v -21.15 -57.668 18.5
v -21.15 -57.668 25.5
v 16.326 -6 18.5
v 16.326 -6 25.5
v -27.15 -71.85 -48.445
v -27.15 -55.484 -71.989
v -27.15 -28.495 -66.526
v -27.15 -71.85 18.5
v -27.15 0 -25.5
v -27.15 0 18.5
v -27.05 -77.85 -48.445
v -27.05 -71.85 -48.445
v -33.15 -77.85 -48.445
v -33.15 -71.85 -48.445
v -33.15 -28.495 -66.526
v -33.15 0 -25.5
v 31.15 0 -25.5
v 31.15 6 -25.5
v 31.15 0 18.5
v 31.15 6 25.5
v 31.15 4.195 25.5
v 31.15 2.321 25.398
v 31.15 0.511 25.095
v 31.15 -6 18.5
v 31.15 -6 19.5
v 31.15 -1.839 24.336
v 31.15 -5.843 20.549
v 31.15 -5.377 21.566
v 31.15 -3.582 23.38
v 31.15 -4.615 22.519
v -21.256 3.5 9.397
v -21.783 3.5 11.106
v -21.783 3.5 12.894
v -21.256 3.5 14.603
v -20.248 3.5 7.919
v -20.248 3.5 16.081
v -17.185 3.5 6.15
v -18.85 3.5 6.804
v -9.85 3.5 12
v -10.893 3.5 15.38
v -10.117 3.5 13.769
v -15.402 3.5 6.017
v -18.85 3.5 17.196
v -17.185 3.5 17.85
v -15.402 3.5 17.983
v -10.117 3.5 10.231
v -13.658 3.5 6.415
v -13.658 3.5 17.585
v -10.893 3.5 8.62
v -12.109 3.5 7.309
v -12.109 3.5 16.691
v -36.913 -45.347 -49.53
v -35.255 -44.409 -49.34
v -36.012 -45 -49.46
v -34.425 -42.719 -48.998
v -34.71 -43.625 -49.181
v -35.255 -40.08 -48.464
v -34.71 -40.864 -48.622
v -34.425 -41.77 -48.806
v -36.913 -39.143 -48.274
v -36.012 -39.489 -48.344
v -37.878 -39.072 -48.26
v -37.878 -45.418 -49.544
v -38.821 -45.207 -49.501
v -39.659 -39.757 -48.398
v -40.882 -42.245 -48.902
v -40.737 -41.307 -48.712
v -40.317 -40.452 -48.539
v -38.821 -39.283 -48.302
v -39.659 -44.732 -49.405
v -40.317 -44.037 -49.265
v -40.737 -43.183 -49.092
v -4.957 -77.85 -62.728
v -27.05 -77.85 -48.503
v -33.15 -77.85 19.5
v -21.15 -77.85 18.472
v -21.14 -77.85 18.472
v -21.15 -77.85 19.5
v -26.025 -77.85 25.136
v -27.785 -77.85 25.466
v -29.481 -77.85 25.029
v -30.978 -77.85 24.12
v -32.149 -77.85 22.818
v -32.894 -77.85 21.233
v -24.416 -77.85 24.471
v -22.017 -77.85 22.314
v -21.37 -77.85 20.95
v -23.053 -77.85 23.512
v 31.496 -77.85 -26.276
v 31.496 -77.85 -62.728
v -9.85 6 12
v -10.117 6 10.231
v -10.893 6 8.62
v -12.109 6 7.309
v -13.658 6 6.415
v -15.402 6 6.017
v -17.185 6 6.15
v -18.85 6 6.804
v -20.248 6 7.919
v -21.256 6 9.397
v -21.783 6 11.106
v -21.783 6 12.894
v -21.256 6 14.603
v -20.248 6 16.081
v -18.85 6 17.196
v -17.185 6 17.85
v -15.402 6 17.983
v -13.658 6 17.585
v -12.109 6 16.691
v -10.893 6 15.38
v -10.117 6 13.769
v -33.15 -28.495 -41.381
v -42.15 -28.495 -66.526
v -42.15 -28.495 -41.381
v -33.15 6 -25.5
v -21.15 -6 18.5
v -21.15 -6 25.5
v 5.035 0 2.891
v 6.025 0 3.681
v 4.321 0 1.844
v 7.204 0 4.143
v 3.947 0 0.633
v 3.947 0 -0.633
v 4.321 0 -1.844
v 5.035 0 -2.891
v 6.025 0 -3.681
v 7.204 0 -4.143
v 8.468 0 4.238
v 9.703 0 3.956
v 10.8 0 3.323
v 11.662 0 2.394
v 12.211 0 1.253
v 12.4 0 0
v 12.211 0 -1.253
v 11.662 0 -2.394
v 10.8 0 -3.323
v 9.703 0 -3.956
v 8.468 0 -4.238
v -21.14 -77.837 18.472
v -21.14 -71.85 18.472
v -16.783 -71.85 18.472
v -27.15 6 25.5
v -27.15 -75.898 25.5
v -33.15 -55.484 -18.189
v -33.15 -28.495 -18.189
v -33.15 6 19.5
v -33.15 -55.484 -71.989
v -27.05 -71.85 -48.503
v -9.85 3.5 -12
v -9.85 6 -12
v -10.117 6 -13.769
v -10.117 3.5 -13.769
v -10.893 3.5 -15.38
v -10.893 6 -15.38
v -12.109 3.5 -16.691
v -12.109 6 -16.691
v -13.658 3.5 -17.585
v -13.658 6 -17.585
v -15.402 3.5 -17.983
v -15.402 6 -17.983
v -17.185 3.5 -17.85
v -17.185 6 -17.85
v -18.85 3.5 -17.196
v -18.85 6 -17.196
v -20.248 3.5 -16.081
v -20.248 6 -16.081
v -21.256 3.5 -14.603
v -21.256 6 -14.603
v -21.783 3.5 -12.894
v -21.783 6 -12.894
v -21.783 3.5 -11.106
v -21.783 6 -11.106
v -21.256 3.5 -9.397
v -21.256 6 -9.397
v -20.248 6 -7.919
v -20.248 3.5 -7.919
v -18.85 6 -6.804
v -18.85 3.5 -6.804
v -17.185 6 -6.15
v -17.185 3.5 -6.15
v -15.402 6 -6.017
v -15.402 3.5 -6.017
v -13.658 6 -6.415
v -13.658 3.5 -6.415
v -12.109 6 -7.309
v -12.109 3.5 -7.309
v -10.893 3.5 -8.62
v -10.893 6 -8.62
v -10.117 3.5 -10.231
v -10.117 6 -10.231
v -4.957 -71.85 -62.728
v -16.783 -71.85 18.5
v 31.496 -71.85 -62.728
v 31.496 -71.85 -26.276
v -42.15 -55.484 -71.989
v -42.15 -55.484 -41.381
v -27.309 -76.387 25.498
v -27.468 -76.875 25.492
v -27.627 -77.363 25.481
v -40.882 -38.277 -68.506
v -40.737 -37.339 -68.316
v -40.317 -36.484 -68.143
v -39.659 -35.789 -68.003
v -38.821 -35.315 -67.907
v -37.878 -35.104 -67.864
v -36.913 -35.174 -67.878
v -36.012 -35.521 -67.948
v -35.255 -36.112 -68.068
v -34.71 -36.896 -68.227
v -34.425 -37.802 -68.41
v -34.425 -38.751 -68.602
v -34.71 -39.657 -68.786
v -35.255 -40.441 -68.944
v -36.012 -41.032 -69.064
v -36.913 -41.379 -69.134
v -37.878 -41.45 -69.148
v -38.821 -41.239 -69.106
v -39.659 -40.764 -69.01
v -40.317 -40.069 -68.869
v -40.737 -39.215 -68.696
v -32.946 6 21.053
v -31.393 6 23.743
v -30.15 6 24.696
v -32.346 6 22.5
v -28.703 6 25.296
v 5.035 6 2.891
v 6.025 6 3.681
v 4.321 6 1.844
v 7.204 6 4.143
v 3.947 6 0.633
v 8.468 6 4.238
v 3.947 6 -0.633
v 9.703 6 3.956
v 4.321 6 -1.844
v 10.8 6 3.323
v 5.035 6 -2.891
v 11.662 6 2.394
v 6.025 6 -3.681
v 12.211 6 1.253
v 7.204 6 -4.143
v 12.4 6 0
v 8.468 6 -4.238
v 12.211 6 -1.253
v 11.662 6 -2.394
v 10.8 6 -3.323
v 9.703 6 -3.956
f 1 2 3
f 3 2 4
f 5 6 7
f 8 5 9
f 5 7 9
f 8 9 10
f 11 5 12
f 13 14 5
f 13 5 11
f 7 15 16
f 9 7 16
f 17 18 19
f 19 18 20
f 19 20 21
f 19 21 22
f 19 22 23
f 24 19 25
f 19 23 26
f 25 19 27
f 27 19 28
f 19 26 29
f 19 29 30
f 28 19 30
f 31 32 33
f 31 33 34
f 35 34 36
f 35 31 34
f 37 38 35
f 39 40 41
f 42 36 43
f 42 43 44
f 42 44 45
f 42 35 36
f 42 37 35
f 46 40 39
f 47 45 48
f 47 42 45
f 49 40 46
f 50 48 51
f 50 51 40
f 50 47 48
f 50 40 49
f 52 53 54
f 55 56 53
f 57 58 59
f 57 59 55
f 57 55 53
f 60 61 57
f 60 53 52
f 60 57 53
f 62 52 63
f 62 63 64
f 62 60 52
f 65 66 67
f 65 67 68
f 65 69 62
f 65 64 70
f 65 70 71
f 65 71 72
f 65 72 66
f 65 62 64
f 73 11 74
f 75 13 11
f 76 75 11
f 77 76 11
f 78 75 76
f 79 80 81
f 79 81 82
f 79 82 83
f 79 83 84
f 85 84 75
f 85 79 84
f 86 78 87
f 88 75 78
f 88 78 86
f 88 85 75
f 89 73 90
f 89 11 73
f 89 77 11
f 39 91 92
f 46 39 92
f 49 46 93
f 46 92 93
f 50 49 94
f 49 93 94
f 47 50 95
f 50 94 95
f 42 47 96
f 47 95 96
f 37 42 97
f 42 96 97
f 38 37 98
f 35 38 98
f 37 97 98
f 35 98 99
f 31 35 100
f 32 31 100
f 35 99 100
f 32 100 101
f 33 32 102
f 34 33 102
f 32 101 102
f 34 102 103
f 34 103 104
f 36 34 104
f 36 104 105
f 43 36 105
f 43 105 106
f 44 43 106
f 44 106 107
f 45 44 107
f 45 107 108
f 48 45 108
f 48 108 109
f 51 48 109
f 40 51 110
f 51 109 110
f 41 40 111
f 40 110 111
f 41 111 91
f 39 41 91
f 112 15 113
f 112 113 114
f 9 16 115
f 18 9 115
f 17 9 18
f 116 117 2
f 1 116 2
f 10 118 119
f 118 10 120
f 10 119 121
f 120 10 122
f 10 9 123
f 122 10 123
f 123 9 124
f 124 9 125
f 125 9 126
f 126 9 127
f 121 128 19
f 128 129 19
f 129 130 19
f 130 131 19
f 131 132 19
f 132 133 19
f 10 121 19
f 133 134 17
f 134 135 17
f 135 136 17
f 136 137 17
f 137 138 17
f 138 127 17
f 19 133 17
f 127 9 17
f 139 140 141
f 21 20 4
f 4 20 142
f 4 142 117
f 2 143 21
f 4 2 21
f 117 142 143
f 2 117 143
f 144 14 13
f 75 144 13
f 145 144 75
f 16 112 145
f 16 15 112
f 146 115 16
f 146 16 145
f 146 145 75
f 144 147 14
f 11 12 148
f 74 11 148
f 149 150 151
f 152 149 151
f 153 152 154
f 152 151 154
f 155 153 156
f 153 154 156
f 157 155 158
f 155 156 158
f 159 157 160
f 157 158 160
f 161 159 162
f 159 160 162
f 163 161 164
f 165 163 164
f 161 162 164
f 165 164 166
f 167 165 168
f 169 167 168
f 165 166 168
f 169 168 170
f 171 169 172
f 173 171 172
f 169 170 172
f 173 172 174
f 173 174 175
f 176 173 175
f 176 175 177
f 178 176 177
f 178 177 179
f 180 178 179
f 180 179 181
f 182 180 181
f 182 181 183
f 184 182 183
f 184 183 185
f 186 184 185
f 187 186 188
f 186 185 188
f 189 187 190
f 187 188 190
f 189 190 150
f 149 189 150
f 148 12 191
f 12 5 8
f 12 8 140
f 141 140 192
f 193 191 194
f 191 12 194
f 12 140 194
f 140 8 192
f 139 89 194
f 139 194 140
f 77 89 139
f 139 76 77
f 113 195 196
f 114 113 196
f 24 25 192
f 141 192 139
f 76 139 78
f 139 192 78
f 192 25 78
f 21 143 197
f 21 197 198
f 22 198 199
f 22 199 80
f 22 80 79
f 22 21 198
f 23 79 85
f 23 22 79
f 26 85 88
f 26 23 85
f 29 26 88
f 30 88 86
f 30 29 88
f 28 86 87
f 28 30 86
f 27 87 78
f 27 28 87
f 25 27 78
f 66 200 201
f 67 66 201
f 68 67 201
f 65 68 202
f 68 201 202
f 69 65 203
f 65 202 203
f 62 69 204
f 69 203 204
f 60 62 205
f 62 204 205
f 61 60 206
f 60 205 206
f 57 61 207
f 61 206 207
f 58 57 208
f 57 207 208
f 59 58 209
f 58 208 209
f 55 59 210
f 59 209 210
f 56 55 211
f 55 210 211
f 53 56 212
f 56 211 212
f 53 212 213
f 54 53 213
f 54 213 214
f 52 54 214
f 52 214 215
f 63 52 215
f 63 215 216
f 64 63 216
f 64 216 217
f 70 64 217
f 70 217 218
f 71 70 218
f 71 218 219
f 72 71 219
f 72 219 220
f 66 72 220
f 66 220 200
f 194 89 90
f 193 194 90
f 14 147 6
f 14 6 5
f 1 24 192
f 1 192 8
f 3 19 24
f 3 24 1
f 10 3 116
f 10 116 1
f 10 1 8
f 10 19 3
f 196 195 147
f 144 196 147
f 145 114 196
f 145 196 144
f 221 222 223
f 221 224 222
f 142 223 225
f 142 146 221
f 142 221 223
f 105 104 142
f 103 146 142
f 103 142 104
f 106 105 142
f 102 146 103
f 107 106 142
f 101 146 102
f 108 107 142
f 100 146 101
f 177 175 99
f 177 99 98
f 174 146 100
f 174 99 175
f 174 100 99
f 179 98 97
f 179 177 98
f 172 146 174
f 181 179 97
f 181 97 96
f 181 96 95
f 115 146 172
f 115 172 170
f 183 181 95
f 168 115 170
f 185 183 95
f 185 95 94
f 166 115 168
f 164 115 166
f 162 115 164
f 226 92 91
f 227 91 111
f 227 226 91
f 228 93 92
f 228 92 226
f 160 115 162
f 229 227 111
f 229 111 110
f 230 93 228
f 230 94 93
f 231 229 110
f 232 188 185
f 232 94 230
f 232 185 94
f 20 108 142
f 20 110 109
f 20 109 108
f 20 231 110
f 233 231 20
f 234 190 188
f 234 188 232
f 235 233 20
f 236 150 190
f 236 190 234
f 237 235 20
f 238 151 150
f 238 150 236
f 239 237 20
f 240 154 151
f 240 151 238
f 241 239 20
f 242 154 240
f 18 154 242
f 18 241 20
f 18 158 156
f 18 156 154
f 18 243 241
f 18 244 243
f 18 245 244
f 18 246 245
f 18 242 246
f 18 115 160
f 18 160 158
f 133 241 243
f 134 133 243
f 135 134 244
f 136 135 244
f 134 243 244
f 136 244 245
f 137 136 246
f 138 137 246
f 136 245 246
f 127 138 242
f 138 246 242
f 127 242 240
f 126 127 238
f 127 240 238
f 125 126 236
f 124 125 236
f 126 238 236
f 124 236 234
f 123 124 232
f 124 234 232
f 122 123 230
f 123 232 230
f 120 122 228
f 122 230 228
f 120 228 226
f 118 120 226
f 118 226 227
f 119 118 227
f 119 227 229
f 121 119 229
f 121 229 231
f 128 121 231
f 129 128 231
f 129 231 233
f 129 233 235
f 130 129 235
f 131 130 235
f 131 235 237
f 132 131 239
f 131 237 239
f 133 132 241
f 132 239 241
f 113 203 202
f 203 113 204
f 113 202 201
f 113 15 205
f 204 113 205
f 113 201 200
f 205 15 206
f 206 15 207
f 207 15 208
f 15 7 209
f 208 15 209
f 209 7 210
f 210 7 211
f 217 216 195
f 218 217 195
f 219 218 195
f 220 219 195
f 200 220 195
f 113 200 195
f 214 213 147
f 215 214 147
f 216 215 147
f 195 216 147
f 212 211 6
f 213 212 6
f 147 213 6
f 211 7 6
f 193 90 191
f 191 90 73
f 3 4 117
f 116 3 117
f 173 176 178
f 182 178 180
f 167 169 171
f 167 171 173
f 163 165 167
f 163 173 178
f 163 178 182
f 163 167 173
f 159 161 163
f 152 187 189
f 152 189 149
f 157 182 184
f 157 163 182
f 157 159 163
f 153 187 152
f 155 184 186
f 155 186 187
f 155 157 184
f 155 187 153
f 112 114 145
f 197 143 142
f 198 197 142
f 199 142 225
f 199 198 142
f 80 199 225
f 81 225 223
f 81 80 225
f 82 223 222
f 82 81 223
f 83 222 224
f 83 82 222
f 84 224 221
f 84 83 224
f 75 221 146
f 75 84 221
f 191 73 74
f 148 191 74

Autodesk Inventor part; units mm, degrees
ref_plane "YZ Plane" through (0, 0, 0) normal (1, 0, 0) x (0, 1, 0)
ref_plane "XZ Plane" through (0, 0, 0) normal (0, 1, 0) x (-1, 0, 0)
ref_plane "XY Plane" through (0, 0, 0) normal (0, 0, 1) x (1, 0, 0)
sketch "Sketch1" plane through (0, 0, 0) normal (0, 1, 0) x (-1, 0, 0)
  line L0 (0, -25.5) -> (-34.15, -25.5)
  line L1 (-34.15, -25.5) -> (-34.15, 0)
  line L2 (-34.15, 0) -> (-34.15, 25.5)
  line L3 (-34.15, 25.5) -> (0, 25.5)
  line L4 (0, 25.5) -> (34.15, 25.5)
  line L5 (34.15, 25.5) -> (34.15, 0)
  line L6 (34.15, 0) -> (34.15, -25.5)
  line L7 (34.15, -25.5) -> (0, -25.5)
  point P0 (0, 0)
extrude "Extrusion1" add sketch "Sketch1" along normal blind 7
sketch "Sketch3" plane through (-34.15, 0, 25.5) normal (0, 0, 1) x (1, 0, 0)
  line L0 (0, 0) -> (0, -78.85)
  point P0 (34.15, 0)
  dimension "d7" = 78.85
sketch "Sketch4" plane through (-34.15, 0, -25.5) normal (-1, 0, 0) x (0, 0, 1)
  line L0 (51, 0) -> (51, -78.85)
  line L1 (51, -78.85) -> (-39, -78.85)
  line L2 (-39, -78.85) -> (-39, -71.85)
  line L3 (0, 0) -> (-39, -71.85)
  line L4 (0, 0) -> (51, 0)
  point P0 (25.5, 0)
  dimension "d10" = 90
  dimension "d11" = 7
extrude "Extrusion2" add sketch "Sketch4" against normal blind 7
sketch "Sketch6" plane through (0, 7, 0) normal (0, 1, 0) x (1, 0, 0)
  line L0 (34.15, -25.5) -> (34.15, 25.5) projected
  line L1 (34.15, 25.5) -> (34.15, 0)
  line L2 (-34.15, 25.5) -> (-34.15, -25.5) projected
  circle A0 centre (8.15, 0) radius 5
  point P0 (0, 0)
  dimension "d20" = 10
extrude "Extrusion4" cut sketch "Sketch6" against normal blind 10
sketch "Sketch7" plane through (-27.15, 0, -25.5) normal (1, 0, 0) x (0, 0, -1)
  line L0 (-51, -78.85) -> (39, -78.85) projected
  line L1 (-51, -78.85) -> (39, -78.85)
  line L2 (39, -78.85) -> (39, -71.85) projected
  line L3 (39, -78.85) -> (39, -71.85)
  line L4 (39, -71.85) -> (-51, -71.85)
  line L5 (-51, 0) -> (-51, -78.85) projected
  line L6 (-51, -78.85) -> (-51, -71.85)
  point P0 (-25.5, 0)
sketch "Sketch8" plane through (0, 0, 0) normal (0, -1, 0) x (1, 0, 0)
  circle A0 centre (8.15, 0) radius 5 projected
  line L0 (8.15, 18.5) -> (34.15, 18.5)
  line L1 (34.15, 25.5) -> (34.15, -25.5) projected
  line L2 (8.15, 25.5) -> (34.15, 25.5)
  line L3 (8.15, 25.5) -> (-27.15, 25.5)
  line L4 (-27.15, 25.5) -> (-27.15, -25.5) projected
  line L5 (8.15, 18.5) -> (-27.15, 18.5)
  line L6 (34.15, 25.5) -> (34.15, 18.5)
  line L7 (-27.15, 25.5) -> (-27.15, 18.5)
  point P0 (0, 0)
extrude "Extrusion6" add sketch "Sketch7" along normal blind 58.5
extrude "Extrusion7" add sketch "Sketch8" along normal blind 78.75 contours L5 L4 L3 L2 L1 L0
sketch "Sketch9" plane through (31.35, 0, -25.5) normal (1, 0, 0) x (0, 0, -1)
  line L0 (-51, -78.75) -> (-51, 7) projected
  line L1 (-44, 0) -> (-44, -71.85) projected
  line L2 (-51, -78.75) -> (-44, -78.75)
  line L3 (-44, -78.75) -> (-44, -71.85)
  line L4 (-44, -71.85) -> (-51, -71.85)
  line L5 (-51, -71.85) -> (-51, -78.75)
  point P0 (-25.5, 0)
extrude "Extrusion8" cut sketch "Sketch9" along normal blind 10
sketch "Sketch10" plane through (0, 7, 0) normal (0, 1, 0) x (1, 0, 0)
  point P0 (0, 0)
sketch "Boceto11" plane through (-34.15, -78.85, -64.5) normal (0, -1, 0) x (1, 0, 0)
  line L0 (72.0718, 89.9914) -> (72.0718, 37.9883)
  line L1 (72.0718, 37.9883) -> (65.5278, 37.9883)
  line L2 (65.5278, 37.9883) -> (65.5278, 89.9914)
  line L3 (72.0718, 89.9914) -> (72.0718, 92.1751)
  line L4 (72.0718, 92.1751) -> (65.5278, 92.1751)
  line L5 (65.5278, 92.1751) -> (65.5278, 89.9914)
  point P0 (34.15, 64.5)
extrude "Extrusión9" cut sketch "Boceto11" against normal blind 1000
sketch "Boceto18" plane through (-34.15, -78.85, 25.5) normal (0, 0, 1) x (1, 0, 0)
  point P0 (34.15, 78.85)
sketch "Boceto23" plane through (-27.15, 0, -25.5) normal (0, 0.4770514, -0.8788754) x (-1, 0, 0)
  point P0 (-27.15, 12.1648)
sketch "Boceto24" plane through (-27.15, 0, -25.5) normal (0, 0, -1) x (-1, 0, 0)
  line L0 (7, -71.85) -> (7, -78.85) projected
  line L1 (7, -78.35) -> (7, -78.85)
  line L2 (7, -78.85) -> (-58.5, -78.85) projected
  line L3 (-58.5, -78.85) -> (-58.5, -77.85)
  line L4 (-58.5, -71.85) -> (-58.5, -78.85) projected
  line L5 (-58.5, -77.85) -> (6, -77.85)
  line L6 (7, -77.85) -> (7, -78.85)
  line L7 (7, -78.85) -> (-58.8392, -78.85)
  line L8 (-58.5278, 7) -> (7, 7) projected
  line L9 (7, -78.85) -> (7, 7)
  line L10 (7, 7) -> (6, 7)
  line L11 (6, 6) -> (6, -77.85)
  line L12 (-58.5278, -71.85) -> (-58.5278, 7) projected
  line L13 (-58.5278, 7) -> (-58.5278, 6)
  line L14 (-58.5278, 6) -> (6, 6)
  line L15 (7, 0) -> (7, 7) projected
  line L16 (7, 6) -> (7, 7)
  line L17 (7, 7) -> (-58.5278, 7)
  point P0 (-27.15, 0)
  dimension "d65" = 1
  dimension "d66" = 1
  dimension "d67" = 1
extrude "Extrusión19" cut sketch "Boceto24" along normal mid plane 1000
sketch "Boceto25" plane through (31.35, -71.85, -64.5) normal (0, 0, -1) x (-1, 0, 0)
  point P0 (31.35, 71.85)
sketch "Boceto27" plane through (31.3778, 0, -25.5) normal (0, 0, -1) x (-1, 0, 0)
  line L0 (0, -71.85) -> (0, 6) projected
  line L1 (0, 6) -> (0.228, 6)
  line L2 (0, 6) -> (64.5278, 6) projected
  line L3 (0.228, 6) -> (0.228, -77.85)
  line L4 (0.0278, -77.85) -> (64.5278, -77.85) projected
  line L5 (0.0278, -71.85) -> (0.0278, -77.85) projected
  line L6 (0.228, -77.85) -> (0.0278, -77.85)
  line L7 (0.0278, -77.85) -> (0, 6)
  line L8 (0, 6) -> (0, -77.85)
  line L9 (0, -77.85) -> (0.0278, -77.85)
  point P0 (31.3778, 0)
  dimension "d73" = 0.228
extrude "Extrusión21" cut sketch "Boceto27" along normal mid plane 1000
sketch "Boceto28" plane through (-33.15, 0, -25.5) normal (-1, 0, 0) x (0, 0, 1)
  point P0 (25.5, 0)
sketch "Boceto30" plane through (-33.15, 0, -25.5) normal (-1, 0, 0) x (0, 0, 1)
  point P0 (25.5, 0)
sketch "Boceto31" plane through (-33.15, 0, -25.5) normal (-1, 0, 0) x (0, 0, 1)
  circle A0 centre (64.38, -38.5153) radius 2.6
  point P0 (25.5, 0)
  point P1 (64.38, -49.4573)
sketch "Boceto32" plane through (-27.15, -71.85, 18.5) normal (0, 1, 0) x (1, 0, 0)
  circle A0 centre (47, 71.5) radius 5 projected
  circle A1 centre (47, 71.5) radius 5
  line L0 (52, 71.5) -> (58.2998, 71.5)
  line L1 (67, 83) -> (67, -7)
  line L2 (58.2998, -7) -> (-6, -7) projected
  line L3 (67, -7) -> (58.2998, -7)
  line L4 (58.2998, -7) -> (58.2998, 83)
  line L5 (47, 76.5) -> (47, 83)
  line L6 (-6, 83) -> (0, 83) projected
  line L7 (-6, 83) -> (-6, 91.5)
  line L8 (-6, 91.5) -> (67, 91.5)
  line L9 (67, 91.5) -> (67, 83)
  line L10 (-6, 83) -> (58.2998, 83)
  point P0 (27.15, 18.5)
extrude "Extrusión23" add sketch "Boceto32" against normal blind 6 contours L4 L10 L6 L7 L8 L9 L1 L3
sketch "Boceto33" plane through (-33.15, -77.85, 25.5) normal (-1, 0, 0) x (0, 0, 1)
  line L0 (0, 83.85) -> (0, 0) projected
  line L1 (0, 74.4354) -> (10.1255, 74.4354)
  line L2 (10.1255, 74.4354) -> (10.1255, 56.6115)
  line L3 (10.9445, 54.9975) -> (18.0243, 49.8171)
  line L4 (18.8039, 48.5979) -> (20.1084, 42.1205)
  line L5 (0, 11.6181) -> (18.1478, 11.6181)
  line L6 (20.1478, 13.6181) -> (20.1478, 41.7256)
  arc A0 (10.1255, 56.6115) -> (10.9445, 54.9975) centre (12.1255, 56.6115) ccw
  arc A1 (18.8039, 48.5979) -> (18.0243, 49.8171) centre (16.8433, 48.203) ccw
  arc A2 (20.1478, 41.7256) -> (20.1084, 42.1205) centre (18.1478, 41.7256) ccw
  arc A3 (18.1478, 11.6181) -> (20.1478, 13.6181) centre (18.1478, 13.6181) ccw
  point P0 (-25.5, 77.85)
  dimension "d91" = 2
extrude "Extrusión24" add sketch "Boceto33" against normal blind 6
extrude "Extrusión25" cut sketch "Boceto31" against normal blind 6
sketch "Boceto34" plane through (-27.15, -77.85, 25.5) normal (1, 0, 0) x (0, 0, -1)
  line L0 (-18.1478, 11.6181) -> (-21.8775, 11.6181)
  line L1 (-21.8775, 11.6181) -> (-21.8775, 48.067)
  line L2 (-21.8775, 48.067) -> (-10.1255, 56.8358)
  line L3 (-10.1255, 74.4354) -> (-10.1255, 56.6115) projected
  line L4 (-10.1255, 56.8358) -> (-10.1255, 48.9642)
  line L5 (-10.1255, 48.9642) -> (-16.6729, 42.1735)
  line L6 (-16.6729, 42.1735) -> (-18.1478, 11.6181)
  point P0 (25.5, 77.85)
extrude "Extrusión26" add sketch "Boceto34" against normal blind 6
fillet "Empalme5" radius 10 3 edges at (-30.15, -21.0142, 35.6255) (-30.15, -29.783, 47.3775) (-30.15, -66.2319, 47.3775)
sketch "Boceto37" plane through (-33.15, 6, 25.5) normal (0, 1, 0) x (1, 0, 0)
  circle A0 centre (41.3, 25.5) radius 6 projected
  line L0 (41.3, 25.5) -> (17.3, 25.5)
  line L1 (17.3, 25.5) -> (17.3, 13.5)
  line L2 (17.3, 13.5) -> (17.3, 37.5)
  circle A1 centre (17.3, 13.5) radius 6
  circle A2 centre (17.3, 37.5) radius 6
  point P0 (33.15, 25.5)
  dimension "d106" = 24
  dimension "d107" = 12
  dimension "d108" = 24
  dimension "d109" = 12
  dimension "d110" = 12
extrude "Extrusión29" cut sketch "Boceto37" against normal blind 2.5 contours A1 | A2
sketch "Boceto39" plane through (-27.15, -71.85, 18.5) normal (0, 1, 0) x (1, 0, 0)
  line L0 (58.2998, -7) -> (58.2998, 0)
  line L1 (58.2998, 44) -> (58.2998, 91.5)
  line L2 (-6, 91.5) -> (67, 91.5) projected
  line L3 (0, 0) -> (58.2998, 0) projected
  line L4 (58.2998, 0) -> (58.2998, -7) projected
  line L5 (58.2998, -7) -> (67, -7) projected
  line L6 (58.2998, -7) -> (67, -7)
  line L7 (67, 91.5) -> (-6, 91.5) projected
  line L8 (67, -7) -> (67, 91.5)
  line L9 (67, 91.5) -> (58.2998, 91.5)
  line L10 (58.2998, 0) -> (58.2998, 44)
  point P0 (27.15, 18.5)
extrude "Extrusión31" cut sketch "Boceto39" against normal blind 10
sketch "Boceto41" plane through (-27.15, -71.85, 18.5) normal (0, 1, 0) x (1, 0, 0)
  line L0 (58.2998, 91.5) -> (58.2998, -7) projected
  line L1 (58.2998, 91.5) -> (31.7998, 91.5)
  line L2 (31.7998, 91.5) -> (31.7998, 65)
  line L3 (31.7998, 65) -> (58.2998, 65)
  line L4 (58.2998, 65) -> (58.2998, 91.5)
  circle A0 centre (31.7998, 65) radius 6
  point P0 (27.15, 18.5)
  dimension "d124" = 26.5
  dimension "d125" = 26.5
  dimension "d126" = 12
extrude "Extrusión32" cut sketch "Boceto41" against normal blind 10 contours A0 L2 L3 | L3 L2 A0
sketch "Sketch42" plane through (-27.15, -71.85, 18.5) normal (0, 1, 0) x (1, 0, 0)
  circle A0 centre (31.7998, 65) radius 6 projected
  line L0 (31.7998, 71) -> (31.7998, 65)
  circle A1 centre (31.7998, 65) radius 18
  line L1 (0, 0) -> (0, 83) projected
  line L2 (0, 83) -> (31.7998, 83)
  line L3 (58.2998, 91.5) -> (-6, 91.5) projected
  line L4 (49.7998, 65) -> (49.7998, 0)
  line L5 (58.2998, 0) -> (0, 0) projected
  line L6 (0, 0) -> (58.2998, 0) projected
  line L7 (49.7998, 0) -> (58.2998, 0)
  line L8 (58.2998, 91.5) -> (58.2998, -7) projected
  line L9 (58.2998, 0) -> (58.2998, 91.5)
  line L10 (0, 83) -> (0, 44) projected
  line L11 (0, 83) -> (-6, 83)
  line L12 (-6, 91.5) -> (-6, 83) projected
  line L13 (-6, 83) -> (-6, 91.5)
  line L14 (58.2998, 91.5) -> (58.2998, 0) projected
  line L15 (-6, 91.5) -> (58.2998, 91.5)
  point P0 (27.15, 18.5)
  point P1 (58.2998, -7)
  dimension "d129" = 36
extrude "Extrusion33" cut sketch "Sketch42" against normal blind 10 contours A1 L2 L11 L12 L3 L8 L5 L4
sketch "Sketch43" plane through (-27.15, -71.85, 18.5) normal (0, 0, -1) x (-1, 0, 0)
  line L0 (6, -6) -> (-58.2998, -6) projected
  line L1 (0, 0) -> (-49.7998, 0) projected
  line L2 (-58.2998, -6) -> (-49.7998, -6)
  line L3 (-49.7998, -6) -> (-49.7998, 0)
  line L4 (-49.7998, 0) -> (-58.2998, 0)
  line L5 (-58.2998, 0) -> (-58.2998, -6)
  point P0 (-27.15, 71.85)
extrude "Extrusion34" add sketch "Sketch43" along normal blind 20
fillet "Fillet7" radius 7 1 edges at (31.1498, -74.85, -1.5)
fillet "Fillet8" radius 2 1 edges at (22.6498, -74.85, -1.5)
sketch "Sketch44" plane through (-33.15, 0, -25.5) normal (-1, 0, 0) x (0, 0, 1)
  line L0 (68.8577, -26.7837) -> (65.1452, -24.0136) projected
  line L1 (61.1255, -3.4146) -> (51, -3.4146) projected
  line L2 (65.1452, -24.0136) -> (51, -24.0136)
  line L3 (51, -24.0136) -> (51, -3.4146)
  line L4 (51, -3.4146) -> (65.1452, -3.4146)
  line L5 (65.1452, -3.4146) -> (65.1452, -24.0136)
  point P0 (25.5, 0)
extrude "Extrusion35" cut sketch "Sketch44" against normal blind 20
sketch "Sketch45" plane through (-33.15, 6, 25.5) normal (0, 1, 0) x (1, 0, 0)
  circle A0 centre (41.3, 25.5) radius 5 projected
  circle A1 centre (41.3, 25.5) radius 4.25
  circle A2 centre (41.3, 25.5) radius 5
  point P0 (33.15, 25.5)
  dimension "d138" = 8.5
extrude "Extrusion36" add sketch "Sketch45" against normal blind 6
sketch "Sketch46" plane through (-33.15, 0, -25.5) normal (-1, 0, 0) x (0, 0, 1)
  point P0 (25.5, 0)
sketch "Sketch47" plane through (-33.15, 0, -25.5) normal (-1, 0, 0) x (0, 0, 1)
  line L0 (-44.1201, -43.7798) -> (-41.0263, -28.4947)
  line L1 (-39, -71.85) -> (0, 0) projected
  line L2 (-41.0263, -28.4947) -> (0, 0)
  line L3 (0, 0) -> (-39, -71.85)
  line L4 (-44.1201, -43.7798) -> (-44.1201, -71.85)
  line L5 (-44.1201, -71.85) -> (-39, -71.85)
  point P0 (25.5, 0)
extrude "Extrusion37" add sketch "Sketch47" against normal blind 6
sketch "Sketch48" plane through (-33.15, 6, -25.5) normal (-1, 0, 0) x (0, 0, 1)
  point P0 (25.5, -6)
sketch "Sketch49" plane through (-33.15, 6, -25.5) normal (-1, 0, 0) x (0, 0, 1)
  point P0 (25.5, -6)
sketch "Sketch50" plane through (-33.15, 6, -25.5) normal (-1, 0, 0) x (0, 0, 1)
  line L0 (-44.1201, -49.7798) -> (-41.0263, -34.4947) projected
  line L1 (-41.0263, -34.4947) -> (-46.4891, -61.4839)
  line L2 (-39, -83.85) -> (51, -83.85) projected
  line L3 (-39, -83.85) -> (-46.4891, -83.85)
  line L4 (-46.4891, -83.85) -> (-46.4891, -61.4839)
  line L5 (-41.0263, -34.4947) -> (-39, -69.2782)
  line L6 (-39, -69.2782) -> (-39, -83.85)
  point P0 (25.5, -6)
extrude "Extrusion38" add sketch "Sketch50" against normal blind 6
sketch "Sketch51" plane through (-33.15, 6, -25.5) normal (-1, 0, 0) x (0, 0, 1)
  line L0 (-41.0263, -34.4947) -> (-46.4891, -61.4839) projected
  line L1 (-41.0263, -34.4947) -> (-46.4891, -61.4839)
  line L2 (-46.4891, -61.4839) -> (-15.8808, -61.4839)
  line L3 (-41.0263, -34.4947) -> (-15.8808, -34.4947)
  line L4 (-15.8808, -34.4947) -> (-15.8808, -61.4839)
  point P0 (25.5, -6)
extrude "Extrusion39" add sketch "Sketch51" along normal blind 9
sketch "Sketch52" plane through (-33.15, -55.4839, -71.9891) normal (0, -1, 0) x (1, 0, 0)
  line L0 (-9, 30.6084) -> (0, 53.8004)
  line L1 (0, 0) -> (0, 97.4891) projected
  line L2 (0, 30.6084) -> (0, 53.8004)
  line L3 (0, 30.6084) -> (-9, 30.6084)
  point P0 (33.15, 71.9891)
extrude "Extrusion40" add sketch "Sketch52" against normal blind 26.989
sketch "Sketch53" plane through (-33.15, -55.4839, -18.1887) normal (-0.9322642, 0, 0.3617781) x (0.3617781, 0, 0.9322642)
  point P0 (28.9496, 55.4839)
sketch "Sketch54" plane through (-33.15, 6, -25.5) normal (-1, 0, 0) x (0, 0, 1)
  line L0 (51, -72.2319) -> (51, -83.85) projected
  line L1 (51, -83.85) -> (86.3988, -83.85)
  line L2 (86.3988, -83.85) -> (86.3988, -18.2813)
  line L3 (86.3988, -18.2813) -> (51, -18.2813)
  line L4 (51, -18.2813) -> (51, -83.85)
  point P0 (25.5, -6)
extrude "Extrusion41" cut sketch "Sketch54" against normal blind 26.989
sketch "Sketch55" plane through (-33.15, -55.4839, -71.9891) normal (0, 0.198384, -0.9801244) x (-1, 0, 0)
  line L0 (9, 6.0722) -> (9, 32.5248) projected
  line L1 (9, 17.5562) -> (4.485, 17.5562)
  line L2 (9, 17.5562) -> (13.515, 17.5562) construction
  circle A0 centre (4.485, 17.5562) radius 3.2465
  point P0 (-33.15, 68.6627)
  dimension "d153" = 4.515
  dimension "d154" = 180
  dimension "d155" = 6.493
extrude "Extrusion42" cut sketch "Sketch55" against normal blind 20
sketch "Sketch56" plane through (-33.15, -77.85, 25.5) normal (0, 0, 1) x (1, 0, 0)
  line L0 (0, 77.85) -> (0, 83.85) projected
  line L1 (0, 83.85) -> (12, 83.85)
  line L2 (64.2998, 83.85) -> (0, 83.85) projected
  line L3 (12, 83.85) -> (12, 0)
  line L4 (6, 0) -> (37.7998, 0) projected
  line L5 (0, 83.85) -> (0, 0) projected
  line L6 (12, 0) -> (0, 0)
  line L7 (0, 0) -> (0, 83.85)
  line L8 (0, 83.85) -> (12, 83.85)
  line L9 (12, 83.85) -> (12, 0)
  line L10 (0, 83.85) -> (64.3, 83.85)
  line L11 (64.3, 83.85) -> (64.3, 71.85)
  line L12 (64.3, 71.85) -> (0, 71.85)
  line L13 (0, 71.85) -> (0, 83.85)
  line L14 (64.2998, 0) -> (64.2998, 83.85) projected
  line L15 (64.3, 71.85) -> (12, 0)
  line L16 (64.3, 71.85) -> (54.5981, 78.9121)
  line L17 (12, 0) -> (3.5198, 8.4904)
  line L18 (3.5198, 8.4904) -> (54.5981, 78.9121)
  line L19 (12, 0) -> (64.2998, 0)
  line L20 (64.3, 71.85) -> (64.2998, 0)
  point P0 (33.15, 77.85)
  point P1 (37.7998, 0)
  point P2 (64.2998, 71.8497)
  point P3 (12, 20.182)
  point P4 (49.4758, 71.85)
  point P5 (12, 71.85)
  dimension "d158" = 12
  dimension "d159" = 64.3
  dimension "d160" = 12
  dimension "d161" = 12
  dimension "d162" = 12
extrude "Extrusion43" cut sketch "Sketch56" against normal blind 20 contours L12 L18 L3 | L14 L19 L4 L15
sketch "Sketch57" plane through (-27.15, -77.85, -64.5) normal (0, -1, 0) x (1, 0, 0)
  point P0 (27.15, 64.5)
sketch "Sketch58" plane through (-27.15, -77.85, -64.5) normal (0, -1, 0) x (1, 0, 0)
  line L0 (0.0098, 82.9715) -> (6.0098, 82.9715)
  line L1 (0.0098, 82.9715) -> (58.6458, 82.9715)
  line L2 (58.6458, 82.9715) -> (58.6458, -19.949)
  line L3 (58.6458, -19.949) -> (0.0098, -19.949)
  line L4 (0.0098, -19.949) -> (0.0098, 82.9715)
  line L5 (58.6458, 1.7715) -> (22.1928, 1.7715)
  line L6 (22.1928, 1.7715) -> (0.0098, 16.0551)
  line L7 (0.0098, 16.0551) -> (0.0098, 82.9715)
  line L8 (58.6458, 1.7715) -> (58.6458, 39.0076)
  line L9 (58.6458, 1.7715) -> (22.1928, 1.7715)
  line L10 (58.6458, 38.2245) -> (58.6458, 1.7715)
  line L11 (58.6458, 38.2245) -> (6.0098, 82.9715)
  point P0 (15.0563, 101.6492)
extrude "Extrusion44" add sketch "Sketch58" against normal blind 6
extrude "Extrusion45" cut sketch "Sketch58" against normal blind 6
extrude "Extrusion46" add sketch "Sketch58" against normal blind 6 contours L0 L11 L2 L5 L6 L4
sketch "Sketch59" plane through (-27.15, 0, -25.5) normal (1, 0, 0) x (0, 0, -1)
  line L0 (46.4891, -77.85) -> (46.4891, -55.4839) projected
  line L1 (22.9449, -71.85) -> (22.9449, -77.85) projected
  line L2 (46.4891, -55.4839) -> (22.9449, -71.85)
  line L3 (22.9449, -71.85) -> (22.9449, -77.85)
  line L4 (22.9449, -77.85) -> (46.4891, -77.85)
  line L5 (46.4891, -55.4839) -> (46.4891, -77.85) projected
  line L6 (46.4891, -77.85) -> (46.4891, -55.4839)
  line L7 (46.4891, -55.4839) -> (46.4891, -77.85)
  point P0 (-25.5, 0)
extrude "Extrusion47" cut sketch "Sketch59" along normal blind 0.1 and the other way blind 6
fillet "Fillet9" radius 6 2 edges at (4.9999, -41.9251, 25.5) (-33.15, -35.925, 25.5)
properties part number "AC23[I3][R]" material "Aluminio 6061"
